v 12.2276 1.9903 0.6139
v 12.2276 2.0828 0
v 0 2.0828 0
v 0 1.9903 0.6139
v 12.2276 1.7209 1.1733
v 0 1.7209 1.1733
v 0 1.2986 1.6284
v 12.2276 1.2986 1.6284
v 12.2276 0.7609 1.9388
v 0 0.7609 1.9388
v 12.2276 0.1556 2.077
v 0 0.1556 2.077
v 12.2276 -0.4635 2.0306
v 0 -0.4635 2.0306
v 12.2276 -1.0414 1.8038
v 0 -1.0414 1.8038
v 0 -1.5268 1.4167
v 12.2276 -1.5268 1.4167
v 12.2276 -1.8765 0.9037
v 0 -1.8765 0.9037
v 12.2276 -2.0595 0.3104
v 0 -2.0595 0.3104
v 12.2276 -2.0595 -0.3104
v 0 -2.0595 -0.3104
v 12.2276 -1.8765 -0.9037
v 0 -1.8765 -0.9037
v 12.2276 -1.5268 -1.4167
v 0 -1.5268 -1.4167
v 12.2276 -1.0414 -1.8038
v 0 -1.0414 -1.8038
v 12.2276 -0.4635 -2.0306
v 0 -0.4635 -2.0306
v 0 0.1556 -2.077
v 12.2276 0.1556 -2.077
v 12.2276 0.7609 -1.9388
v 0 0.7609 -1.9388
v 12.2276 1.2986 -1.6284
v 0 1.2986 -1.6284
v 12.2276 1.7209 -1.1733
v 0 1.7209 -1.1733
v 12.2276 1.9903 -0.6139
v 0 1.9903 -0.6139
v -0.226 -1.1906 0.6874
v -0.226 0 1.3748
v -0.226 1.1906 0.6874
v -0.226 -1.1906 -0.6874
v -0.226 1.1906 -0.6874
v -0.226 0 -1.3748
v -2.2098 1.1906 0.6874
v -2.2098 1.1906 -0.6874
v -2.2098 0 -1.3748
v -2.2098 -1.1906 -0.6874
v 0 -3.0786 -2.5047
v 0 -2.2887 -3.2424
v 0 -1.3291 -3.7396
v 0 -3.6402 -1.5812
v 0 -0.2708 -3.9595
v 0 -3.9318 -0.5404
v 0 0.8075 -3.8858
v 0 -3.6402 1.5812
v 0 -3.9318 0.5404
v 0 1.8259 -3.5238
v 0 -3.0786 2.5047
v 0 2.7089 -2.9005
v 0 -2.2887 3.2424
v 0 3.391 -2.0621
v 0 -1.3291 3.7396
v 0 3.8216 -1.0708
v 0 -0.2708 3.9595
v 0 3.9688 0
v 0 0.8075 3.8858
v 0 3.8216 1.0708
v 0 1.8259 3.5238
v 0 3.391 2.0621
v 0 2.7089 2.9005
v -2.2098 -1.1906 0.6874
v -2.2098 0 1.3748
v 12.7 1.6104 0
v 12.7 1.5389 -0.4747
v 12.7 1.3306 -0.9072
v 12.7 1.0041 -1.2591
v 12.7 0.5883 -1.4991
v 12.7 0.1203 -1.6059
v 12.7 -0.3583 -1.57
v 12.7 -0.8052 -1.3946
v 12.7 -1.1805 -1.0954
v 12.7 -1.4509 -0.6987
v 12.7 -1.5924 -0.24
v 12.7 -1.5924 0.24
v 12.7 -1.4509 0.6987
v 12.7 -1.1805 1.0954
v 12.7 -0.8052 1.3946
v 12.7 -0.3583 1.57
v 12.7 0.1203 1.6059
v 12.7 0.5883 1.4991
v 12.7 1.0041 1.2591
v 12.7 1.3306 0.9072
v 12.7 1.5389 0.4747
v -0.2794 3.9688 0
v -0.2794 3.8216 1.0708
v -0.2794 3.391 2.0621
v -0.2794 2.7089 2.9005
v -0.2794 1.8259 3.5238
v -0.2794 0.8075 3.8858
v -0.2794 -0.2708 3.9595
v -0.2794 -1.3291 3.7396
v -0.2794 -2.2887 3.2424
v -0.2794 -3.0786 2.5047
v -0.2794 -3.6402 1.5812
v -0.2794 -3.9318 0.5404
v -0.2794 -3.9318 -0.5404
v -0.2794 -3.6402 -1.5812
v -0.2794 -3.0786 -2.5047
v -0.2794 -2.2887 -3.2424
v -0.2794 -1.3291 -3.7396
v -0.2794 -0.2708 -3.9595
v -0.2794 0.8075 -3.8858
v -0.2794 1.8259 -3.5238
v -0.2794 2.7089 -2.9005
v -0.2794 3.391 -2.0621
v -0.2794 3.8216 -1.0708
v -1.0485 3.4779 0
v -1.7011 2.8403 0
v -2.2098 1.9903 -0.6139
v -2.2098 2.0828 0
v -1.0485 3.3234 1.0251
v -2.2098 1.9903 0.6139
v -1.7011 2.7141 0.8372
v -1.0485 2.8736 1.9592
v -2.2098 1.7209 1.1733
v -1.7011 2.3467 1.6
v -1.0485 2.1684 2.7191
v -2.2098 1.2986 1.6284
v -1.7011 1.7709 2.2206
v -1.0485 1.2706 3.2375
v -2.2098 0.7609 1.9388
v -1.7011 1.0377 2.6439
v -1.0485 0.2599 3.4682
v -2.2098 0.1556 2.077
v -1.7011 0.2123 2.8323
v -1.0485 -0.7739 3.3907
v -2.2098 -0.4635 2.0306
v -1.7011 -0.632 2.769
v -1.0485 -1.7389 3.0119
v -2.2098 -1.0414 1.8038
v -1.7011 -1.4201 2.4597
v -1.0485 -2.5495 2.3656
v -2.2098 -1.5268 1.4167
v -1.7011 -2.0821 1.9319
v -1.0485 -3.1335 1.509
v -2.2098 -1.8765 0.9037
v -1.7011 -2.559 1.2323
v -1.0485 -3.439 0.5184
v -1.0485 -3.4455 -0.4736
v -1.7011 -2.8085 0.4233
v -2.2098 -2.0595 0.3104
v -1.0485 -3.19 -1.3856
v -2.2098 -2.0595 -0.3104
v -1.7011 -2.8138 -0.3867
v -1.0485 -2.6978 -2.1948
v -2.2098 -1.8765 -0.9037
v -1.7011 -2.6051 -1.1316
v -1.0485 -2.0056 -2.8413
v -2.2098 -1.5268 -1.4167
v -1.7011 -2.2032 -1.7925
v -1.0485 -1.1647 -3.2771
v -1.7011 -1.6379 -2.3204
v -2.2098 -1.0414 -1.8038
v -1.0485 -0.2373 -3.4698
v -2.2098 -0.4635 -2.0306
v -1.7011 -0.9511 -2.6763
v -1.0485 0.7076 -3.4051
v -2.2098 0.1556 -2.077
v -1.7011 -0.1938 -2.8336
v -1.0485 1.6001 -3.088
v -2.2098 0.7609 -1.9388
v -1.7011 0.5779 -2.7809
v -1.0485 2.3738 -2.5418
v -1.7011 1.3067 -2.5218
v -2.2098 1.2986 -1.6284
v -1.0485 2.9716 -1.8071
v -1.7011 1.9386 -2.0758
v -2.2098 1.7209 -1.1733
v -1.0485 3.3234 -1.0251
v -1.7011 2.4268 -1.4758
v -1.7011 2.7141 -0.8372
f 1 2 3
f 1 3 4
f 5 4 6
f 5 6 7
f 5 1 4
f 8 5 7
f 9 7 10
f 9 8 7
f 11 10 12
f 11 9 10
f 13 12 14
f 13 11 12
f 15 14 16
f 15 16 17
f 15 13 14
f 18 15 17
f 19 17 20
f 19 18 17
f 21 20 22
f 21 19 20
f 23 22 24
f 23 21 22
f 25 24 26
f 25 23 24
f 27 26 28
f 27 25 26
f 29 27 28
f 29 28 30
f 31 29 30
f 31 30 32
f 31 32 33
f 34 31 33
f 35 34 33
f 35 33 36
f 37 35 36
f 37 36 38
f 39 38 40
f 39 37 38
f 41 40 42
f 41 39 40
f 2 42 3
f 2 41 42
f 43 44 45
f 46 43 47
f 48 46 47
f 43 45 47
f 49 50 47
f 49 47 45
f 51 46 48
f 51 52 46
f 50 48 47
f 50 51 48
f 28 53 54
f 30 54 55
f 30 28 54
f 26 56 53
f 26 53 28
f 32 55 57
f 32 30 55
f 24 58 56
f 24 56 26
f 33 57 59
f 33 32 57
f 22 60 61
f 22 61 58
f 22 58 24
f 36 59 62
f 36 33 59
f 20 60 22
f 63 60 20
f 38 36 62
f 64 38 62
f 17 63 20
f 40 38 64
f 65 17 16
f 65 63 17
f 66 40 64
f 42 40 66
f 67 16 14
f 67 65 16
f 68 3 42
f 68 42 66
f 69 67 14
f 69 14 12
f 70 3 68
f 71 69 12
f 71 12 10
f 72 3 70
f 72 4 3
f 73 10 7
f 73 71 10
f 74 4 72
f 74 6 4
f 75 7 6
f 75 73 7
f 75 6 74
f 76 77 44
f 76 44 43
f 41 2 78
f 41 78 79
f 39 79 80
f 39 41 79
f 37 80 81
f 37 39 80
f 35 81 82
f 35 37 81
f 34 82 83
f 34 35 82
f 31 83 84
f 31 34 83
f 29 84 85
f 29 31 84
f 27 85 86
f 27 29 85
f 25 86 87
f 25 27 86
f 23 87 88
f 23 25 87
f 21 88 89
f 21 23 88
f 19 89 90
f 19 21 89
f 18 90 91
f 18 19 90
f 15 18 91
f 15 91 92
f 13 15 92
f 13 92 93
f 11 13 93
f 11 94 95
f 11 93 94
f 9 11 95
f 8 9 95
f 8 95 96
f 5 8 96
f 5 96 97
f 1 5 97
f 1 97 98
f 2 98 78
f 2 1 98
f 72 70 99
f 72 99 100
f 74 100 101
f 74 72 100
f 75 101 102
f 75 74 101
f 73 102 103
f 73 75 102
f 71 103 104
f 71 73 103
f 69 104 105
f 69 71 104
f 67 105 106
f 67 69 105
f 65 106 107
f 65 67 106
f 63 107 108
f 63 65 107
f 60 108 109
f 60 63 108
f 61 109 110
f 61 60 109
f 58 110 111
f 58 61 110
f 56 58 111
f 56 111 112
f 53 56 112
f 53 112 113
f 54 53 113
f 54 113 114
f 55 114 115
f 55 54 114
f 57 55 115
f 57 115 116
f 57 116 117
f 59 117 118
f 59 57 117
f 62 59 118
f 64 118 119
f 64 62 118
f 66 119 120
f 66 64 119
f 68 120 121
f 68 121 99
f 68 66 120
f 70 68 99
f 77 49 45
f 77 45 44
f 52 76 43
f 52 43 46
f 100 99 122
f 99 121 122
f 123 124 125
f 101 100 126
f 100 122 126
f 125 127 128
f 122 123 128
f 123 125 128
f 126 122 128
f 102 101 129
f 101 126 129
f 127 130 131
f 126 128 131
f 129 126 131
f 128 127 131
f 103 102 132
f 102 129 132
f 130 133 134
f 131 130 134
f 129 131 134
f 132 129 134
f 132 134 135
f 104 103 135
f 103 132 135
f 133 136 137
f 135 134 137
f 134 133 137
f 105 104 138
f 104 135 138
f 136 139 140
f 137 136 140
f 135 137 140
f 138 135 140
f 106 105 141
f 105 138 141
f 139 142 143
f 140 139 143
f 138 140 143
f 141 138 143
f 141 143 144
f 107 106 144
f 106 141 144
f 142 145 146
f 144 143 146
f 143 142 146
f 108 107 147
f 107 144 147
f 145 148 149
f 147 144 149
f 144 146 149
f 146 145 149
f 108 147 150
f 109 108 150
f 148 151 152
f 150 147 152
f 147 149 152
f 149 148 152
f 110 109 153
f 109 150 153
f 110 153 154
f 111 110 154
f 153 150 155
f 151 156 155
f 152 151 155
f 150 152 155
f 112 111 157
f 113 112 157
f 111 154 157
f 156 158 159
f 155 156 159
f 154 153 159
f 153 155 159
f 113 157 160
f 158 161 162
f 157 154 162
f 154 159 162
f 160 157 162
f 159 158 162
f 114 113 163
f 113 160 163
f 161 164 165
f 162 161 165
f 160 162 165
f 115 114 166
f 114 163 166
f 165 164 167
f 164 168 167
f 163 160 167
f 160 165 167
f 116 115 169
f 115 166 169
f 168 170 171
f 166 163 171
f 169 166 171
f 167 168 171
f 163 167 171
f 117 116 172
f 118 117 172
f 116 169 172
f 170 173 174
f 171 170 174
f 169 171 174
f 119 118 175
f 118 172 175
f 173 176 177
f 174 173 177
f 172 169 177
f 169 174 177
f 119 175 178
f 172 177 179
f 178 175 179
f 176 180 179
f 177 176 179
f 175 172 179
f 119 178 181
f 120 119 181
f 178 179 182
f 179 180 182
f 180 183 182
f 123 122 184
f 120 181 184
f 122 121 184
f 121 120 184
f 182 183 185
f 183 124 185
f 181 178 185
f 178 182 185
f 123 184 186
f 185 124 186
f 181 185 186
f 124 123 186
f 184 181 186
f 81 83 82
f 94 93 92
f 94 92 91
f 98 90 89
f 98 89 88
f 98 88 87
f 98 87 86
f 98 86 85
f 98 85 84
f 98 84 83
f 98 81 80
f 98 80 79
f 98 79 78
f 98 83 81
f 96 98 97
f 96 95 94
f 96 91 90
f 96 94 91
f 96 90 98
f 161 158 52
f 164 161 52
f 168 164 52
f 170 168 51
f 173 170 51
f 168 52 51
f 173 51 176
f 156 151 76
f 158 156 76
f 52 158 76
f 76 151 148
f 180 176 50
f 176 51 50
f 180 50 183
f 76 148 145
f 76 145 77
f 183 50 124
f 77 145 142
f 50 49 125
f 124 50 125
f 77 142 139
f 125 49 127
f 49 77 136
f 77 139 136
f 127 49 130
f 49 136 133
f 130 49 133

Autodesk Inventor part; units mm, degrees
sketch "Sketch_1" plane through (0, 0, 0) normal (0, 0, 1) x (1, 0, 0)
  line L0 (12.7, 0) -> (-2.2098, 0)
  line L1 (-2.2098, 0) -> (-2.2098, 2.0828)
  arc A0 (-0.2794, 3.9688) -> (-2.2098, 2.0828) centre (1.7151, -0.0037) ccw
  line L2 (-0.2794, 3.9688) -> (0, 3.9688)
  line L3 (0, 3.9688) -> (0, 2.0828)
  line L4 (0, 2.0828) -> (12.2276, 2.0828)
  line L5 (12.2276, 2.0828) -> (12.7, 1.6104)
  line L6 (12.7, 1.6104) -> (12.7, 0)
  line L7 (12.7, 0) -> (-2.2098, 0)
revolve "Revolution1" add sketch "Sketch_1" angle 360 about axis through (12.7, 0, 0) along (1, 0, 0)
thread "Thread1" size "8-32 UNC" class "2A" standard "ANSI Unified Screw Threads" length 11.4093
sketch "Sketch_3" plane through (-2.2098, 0, 0) normal (1, 0, 0) x (0, 0, -1)
  line L0 (-1.3748, 0) -> (-0.6874, -1.1906)
  line L1 (-0.6874, -1.1906) -> (0.6874, -1.1906)
  line L2 (0.6874, -1.1906) -> (1.3748, 0)
  line L3 (1.3748, 0) -> (0.6874, 1.1906)
  line L4 (0.6874, 1.1906) -> (-0.6874, 1.1906)
  line L5 (-0.6874, 1.1906) -> (-1.3748, 0)
extrude "Extrusion1" cut sketch "Sketch_3" along normal mid plane 3.9675
ref_plane "screw_XY" through (0, 0, 0) normal (1, 0, 0) x (0, 0, -1)
ref_plane "screw_YZ" through (0, 0, 0) normal (0, 0, -1) x (0, 1, 0)
ref_plane "screw_ZX" through (0, 0, 0) normal (0, 1, 0) x (1, 0, 0)
ref_plane "to_nut_XY" through (12.7, 0, 0) normal (1, 0, 0) x (0, 0, -1)
ref_plane "to_nut_YZ" through (12.7, 0, 0) normal (0, 0, -1) x (0, 1, 0)
ref_plane "to_nut_ZX" through (12.7, 0, 0) normal (0, 1, 0) x (1, 0, 0)
properties part number "3024"
